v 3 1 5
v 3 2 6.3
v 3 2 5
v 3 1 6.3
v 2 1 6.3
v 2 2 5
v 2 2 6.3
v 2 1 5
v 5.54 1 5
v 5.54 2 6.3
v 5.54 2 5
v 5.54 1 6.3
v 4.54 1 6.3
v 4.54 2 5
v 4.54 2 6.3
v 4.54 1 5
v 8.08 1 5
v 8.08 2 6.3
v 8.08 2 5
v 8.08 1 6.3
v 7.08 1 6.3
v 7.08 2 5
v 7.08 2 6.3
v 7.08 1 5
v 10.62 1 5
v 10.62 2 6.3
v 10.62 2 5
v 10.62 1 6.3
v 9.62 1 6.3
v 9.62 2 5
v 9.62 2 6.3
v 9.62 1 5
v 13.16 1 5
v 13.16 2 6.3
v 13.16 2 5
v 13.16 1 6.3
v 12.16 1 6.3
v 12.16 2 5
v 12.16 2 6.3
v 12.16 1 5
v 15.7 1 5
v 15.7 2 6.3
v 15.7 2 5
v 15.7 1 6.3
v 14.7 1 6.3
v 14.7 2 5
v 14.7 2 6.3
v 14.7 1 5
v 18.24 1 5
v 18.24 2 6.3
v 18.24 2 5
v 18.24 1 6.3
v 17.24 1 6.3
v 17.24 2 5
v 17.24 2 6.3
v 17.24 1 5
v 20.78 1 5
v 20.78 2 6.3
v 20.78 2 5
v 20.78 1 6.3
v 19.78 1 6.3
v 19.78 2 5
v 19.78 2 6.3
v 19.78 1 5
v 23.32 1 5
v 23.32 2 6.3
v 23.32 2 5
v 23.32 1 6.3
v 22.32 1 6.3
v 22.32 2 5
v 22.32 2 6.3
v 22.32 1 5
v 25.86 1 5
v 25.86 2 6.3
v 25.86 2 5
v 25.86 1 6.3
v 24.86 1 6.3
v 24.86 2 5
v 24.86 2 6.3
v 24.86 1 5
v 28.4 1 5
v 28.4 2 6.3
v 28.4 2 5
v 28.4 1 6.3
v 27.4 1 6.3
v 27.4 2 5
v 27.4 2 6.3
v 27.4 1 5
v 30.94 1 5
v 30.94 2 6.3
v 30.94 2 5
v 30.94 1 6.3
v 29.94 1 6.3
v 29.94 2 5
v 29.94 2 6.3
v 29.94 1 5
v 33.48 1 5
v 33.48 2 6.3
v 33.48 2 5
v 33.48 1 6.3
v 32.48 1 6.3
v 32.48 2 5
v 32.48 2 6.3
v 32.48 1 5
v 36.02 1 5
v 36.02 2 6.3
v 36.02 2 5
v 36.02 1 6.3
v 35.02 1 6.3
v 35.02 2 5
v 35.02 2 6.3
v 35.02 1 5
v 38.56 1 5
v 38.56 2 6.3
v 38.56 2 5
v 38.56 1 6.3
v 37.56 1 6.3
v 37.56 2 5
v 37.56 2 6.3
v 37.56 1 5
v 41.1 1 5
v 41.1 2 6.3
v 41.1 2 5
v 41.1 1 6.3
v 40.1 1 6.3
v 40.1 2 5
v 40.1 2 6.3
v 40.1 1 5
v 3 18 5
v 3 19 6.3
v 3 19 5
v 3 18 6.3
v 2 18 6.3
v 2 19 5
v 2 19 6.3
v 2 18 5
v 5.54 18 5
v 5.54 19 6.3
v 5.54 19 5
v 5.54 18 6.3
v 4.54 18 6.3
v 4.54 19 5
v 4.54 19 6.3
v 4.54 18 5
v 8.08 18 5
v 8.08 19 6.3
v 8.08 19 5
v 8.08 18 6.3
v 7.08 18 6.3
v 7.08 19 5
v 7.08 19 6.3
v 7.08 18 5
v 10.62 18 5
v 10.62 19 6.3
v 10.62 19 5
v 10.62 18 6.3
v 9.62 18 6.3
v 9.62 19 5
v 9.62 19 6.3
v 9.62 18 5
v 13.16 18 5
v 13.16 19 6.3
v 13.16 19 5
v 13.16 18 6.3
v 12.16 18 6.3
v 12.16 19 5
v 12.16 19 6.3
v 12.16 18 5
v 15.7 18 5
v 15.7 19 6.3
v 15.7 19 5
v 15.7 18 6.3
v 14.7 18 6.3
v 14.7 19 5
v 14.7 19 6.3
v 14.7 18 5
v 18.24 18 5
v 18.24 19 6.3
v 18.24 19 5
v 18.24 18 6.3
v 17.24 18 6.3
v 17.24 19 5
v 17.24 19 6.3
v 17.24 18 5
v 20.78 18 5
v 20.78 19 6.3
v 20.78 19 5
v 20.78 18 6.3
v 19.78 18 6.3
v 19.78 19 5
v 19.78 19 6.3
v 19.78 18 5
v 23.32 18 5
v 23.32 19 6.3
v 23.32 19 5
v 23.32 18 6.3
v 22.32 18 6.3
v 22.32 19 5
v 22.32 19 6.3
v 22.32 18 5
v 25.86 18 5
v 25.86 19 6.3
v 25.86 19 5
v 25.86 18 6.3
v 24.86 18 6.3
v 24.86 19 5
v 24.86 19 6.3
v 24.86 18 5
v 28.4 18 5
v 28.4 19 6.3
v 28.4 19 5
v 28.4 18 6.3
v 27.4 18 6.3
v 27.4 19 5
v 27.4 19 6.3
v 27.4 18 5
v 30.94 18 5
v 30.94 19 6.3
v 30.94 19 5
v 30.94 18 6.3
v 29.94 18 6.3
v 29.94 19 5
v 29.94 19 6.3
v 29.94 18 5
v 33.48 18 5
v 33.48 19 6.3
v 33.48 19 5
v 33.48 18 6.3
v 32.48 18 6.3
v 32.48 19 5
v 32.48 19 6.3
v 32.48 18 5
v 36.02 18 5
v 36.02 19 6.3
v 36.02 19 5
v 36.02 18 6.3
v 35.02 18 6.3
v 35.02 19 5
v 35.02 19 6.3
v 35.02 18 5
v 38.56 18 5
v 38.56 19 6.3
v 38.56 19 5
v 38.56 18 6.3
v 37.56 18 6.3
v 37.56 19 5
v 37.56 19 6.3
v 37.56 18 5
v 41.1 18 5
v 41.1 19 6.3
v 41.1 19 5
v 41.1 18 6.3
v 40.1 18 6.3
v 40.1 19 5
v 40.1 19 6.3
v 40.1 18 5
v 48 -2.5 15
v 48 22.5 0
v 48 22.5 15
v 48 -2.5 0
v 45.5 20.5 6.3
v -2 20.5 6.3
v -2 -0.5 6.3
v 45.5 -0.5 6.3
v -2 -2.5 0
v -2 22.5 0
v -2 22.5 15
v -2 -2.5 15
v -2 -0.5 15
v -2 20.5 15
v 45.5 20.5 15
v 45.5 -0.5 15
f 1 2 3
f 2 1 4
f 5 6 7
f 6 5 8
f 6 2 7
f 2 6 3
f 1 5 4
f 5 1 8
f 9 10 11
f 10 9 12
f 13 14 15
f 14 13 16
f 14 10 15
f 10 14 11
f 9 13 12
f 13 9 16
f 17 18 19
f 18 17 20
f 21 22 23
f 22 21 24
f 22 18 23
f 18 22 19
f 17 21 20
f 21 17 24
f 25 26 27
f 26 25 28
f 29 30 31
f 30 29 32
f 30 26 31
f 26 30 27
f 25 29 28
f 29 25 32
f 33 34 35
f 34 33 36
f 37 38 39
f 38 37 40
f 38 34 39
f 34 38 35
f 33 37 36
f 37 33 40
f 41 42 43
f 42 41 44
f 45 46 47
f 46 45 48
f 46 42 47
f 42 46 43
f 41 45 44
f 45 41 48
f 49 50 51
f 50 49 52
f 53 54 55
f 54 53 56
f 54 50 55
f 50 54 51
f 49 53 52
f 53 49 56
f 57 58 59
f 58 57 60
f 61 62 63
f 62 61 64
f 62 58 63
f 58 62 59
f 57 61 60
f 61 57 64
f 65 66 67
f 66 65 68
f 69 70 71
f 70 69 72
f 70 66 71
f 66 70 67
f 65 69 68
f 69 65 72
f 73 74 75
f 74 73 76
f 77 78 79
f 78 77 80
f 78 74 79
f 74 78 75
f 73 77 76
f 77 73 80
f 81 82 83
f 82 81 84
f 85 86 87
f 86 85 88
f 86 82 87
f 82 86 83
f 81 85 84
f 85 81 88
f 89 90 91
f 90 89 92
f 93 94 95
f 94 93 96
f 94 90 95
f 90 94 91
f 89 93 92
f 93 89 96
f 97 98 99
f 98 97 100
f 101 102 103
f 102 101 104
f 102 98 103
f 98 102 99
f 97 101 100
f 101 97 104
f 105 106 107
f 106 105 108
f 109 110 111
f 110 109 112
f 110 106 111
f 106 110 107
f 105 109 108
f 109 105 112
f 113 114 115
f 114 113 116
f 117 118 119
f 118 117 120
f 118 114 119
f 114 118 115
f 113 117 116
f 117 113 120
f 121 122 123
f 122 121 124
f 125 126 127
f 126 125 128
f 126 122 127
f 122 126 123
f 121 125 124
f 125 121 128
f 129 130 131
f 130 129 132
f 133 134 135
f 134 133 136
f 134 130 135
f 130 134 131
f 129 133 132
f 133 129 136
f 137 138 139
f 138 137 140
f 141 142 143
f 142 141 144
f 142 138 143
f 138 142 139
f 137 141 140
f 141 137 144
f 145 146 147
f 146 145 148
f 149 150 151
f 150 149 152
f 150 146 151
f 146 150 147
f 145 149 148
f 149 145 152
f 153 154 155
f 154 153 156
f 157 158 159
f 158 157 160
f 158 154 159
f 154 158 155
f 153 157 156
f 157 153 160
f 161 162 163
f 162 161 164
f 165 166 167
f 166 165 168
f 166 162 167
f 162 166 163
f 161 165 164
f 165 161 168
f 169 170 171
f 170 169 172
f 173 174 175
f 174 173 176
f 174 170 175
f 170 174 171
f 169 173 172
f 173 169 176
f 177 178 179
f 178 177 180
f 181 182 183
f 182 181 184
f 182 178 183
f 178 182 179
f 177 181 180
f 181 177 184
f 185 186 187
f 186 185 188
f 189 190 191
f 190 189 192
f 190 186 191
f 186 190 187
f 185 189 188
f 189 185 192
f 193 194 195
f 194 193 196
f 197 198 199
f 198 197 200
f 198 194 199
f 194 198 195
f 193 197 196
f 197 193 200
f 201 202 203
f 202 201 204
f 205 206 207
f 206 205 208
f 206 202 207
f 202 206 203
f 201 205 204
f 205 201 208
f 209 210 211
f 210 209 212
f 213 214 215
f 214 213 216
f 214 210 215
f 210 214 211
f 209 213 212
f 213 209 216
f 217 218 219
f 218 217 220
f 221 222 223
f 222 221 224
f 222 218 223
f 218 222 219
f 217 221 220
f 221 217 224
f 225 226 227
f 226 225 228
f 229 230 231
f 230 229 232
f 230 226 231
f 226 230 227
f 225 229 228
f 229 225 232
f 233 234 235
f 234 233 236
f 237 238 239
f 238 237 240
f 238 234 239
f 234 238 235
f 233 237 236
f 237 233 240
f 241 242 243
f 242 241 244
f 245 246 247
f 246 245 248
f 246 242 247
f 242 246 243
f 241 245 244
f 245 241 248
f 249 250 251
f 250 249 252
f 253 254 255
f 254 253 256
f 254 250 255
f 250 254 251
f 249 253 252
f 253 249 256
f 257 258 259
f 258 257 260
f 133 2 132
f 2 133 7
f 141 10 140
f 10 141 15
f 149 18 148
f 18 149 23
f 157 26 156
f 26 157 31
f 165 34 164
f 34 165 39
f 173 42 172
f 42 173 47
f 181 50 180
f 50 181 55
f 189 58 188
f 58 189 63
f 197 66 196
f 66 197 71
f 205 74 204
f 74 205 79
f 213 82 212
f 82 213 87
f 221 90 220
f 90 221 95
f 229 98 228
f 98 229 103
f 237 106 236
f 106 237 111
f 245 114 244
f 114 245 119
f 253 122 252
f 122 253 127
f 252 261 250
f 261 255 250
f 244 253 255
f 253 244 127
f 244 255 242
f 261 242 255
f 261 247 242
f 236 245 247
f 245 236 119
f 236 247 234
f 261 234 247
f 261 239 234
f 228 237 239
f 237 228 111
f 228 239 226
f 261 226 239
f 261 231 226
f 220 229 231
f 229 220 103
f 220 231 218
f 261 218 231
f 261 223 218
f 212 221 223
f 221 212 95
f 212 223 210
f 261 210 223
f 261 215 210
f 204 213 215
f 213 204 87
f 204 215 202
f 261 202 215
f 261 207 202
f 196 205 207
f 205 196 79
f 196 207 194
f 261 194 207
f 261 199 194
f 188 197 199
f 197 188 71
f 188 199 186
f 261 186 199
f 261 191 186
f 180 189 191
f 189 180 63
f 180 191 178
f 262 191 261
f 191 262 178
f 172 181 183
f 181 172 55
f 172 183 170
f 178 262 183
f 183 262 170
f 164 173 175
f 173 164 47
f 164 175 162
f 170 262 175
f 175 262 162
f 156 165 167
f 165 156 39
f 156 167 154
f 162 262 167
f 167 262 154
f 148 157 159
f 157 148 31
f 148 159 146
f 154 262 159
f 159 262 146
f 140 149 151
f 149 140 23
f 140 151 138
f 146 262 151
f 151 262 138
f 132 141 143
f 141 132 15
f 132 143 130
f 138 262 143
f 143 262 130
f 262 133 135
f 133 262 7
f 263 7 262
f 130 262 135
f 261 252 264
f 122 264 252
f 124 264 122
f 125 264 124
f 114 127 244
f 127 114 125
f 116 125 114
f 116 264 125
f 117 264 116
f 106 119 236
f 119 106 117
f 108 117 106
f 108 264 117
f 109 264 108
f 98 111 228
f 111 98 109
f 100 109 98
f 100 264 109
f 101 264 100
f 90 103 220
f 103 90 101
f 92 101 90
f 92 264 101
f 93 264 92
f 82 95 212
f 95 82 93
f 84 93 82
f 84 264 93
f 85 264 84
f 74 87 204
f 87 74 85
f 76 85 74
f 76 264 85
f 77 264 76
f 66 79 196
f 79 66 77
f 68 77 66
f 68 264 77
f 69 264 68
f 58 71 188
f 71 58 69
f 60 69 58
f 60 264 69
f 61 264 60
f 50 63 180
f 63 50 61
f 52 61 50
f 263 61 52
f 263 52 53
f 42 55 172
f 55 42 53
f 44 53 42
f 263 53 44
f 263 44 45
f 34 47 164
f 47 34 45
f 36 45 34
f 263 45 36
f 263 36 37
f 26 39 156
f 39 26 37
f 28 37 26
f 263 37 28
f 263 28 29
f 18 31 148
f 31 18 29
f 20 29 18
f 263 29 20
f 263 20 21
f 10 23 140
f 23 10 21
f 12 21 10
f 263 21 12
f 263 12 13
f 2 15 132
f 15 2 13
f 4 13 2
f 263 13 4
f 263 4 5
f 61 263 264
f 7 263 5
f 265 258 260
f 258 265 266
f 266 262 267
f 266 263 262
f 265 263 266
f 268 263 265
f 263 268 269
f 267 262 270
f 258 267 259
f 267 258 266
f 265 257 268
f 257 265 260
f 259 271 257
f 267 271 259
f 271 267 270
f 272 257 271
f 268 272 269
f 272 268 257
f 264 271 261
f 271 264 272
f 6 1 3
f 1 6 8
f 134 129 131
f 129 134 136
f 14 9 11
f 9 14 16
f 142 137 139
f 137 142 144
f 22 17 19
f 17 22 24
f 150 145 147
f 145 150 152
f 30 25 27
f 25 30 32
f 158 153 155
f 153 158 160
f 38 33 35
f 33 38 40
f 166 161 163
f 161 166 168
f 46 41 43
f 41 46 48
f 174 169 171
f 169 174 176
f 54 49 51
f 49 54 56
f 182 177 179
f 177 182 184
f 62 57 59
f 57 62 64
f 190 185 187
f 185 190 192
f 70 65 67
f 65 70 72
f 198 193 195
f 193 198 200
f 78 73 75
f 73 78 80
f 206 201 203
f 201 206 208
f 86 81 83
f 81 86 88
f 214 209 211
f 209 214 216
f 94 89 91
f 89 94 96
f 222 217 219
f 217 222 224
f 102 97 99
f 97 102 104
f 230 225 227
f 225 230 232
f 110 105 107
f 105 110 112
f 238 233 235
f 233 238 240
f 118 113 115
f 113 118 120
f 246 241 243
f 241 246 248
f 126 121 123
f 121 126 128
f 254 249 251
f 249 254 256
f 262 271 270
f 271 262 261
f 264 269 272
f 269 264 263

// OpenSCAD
difference(){
    translate([-2,-2.5,0]){
    cube([50,25,6.3]);
    }
    for (i = [0:15]){
translate([2+i*2.54,1,0.3]){    
    #cube([1,1,7]);
    
}
}
for (i = [0:15]){
translate([2+i*2.54,16+2,0.3]){    
    #cube([1,1,7]);
}
}
    
}

difference(){
    translate([-2,-2.5,0]){
    cube([50,25,15]);
    } 
    translate([-2.5,-0.5,5]){
    cube([50-2,21,11]);
    }
}
